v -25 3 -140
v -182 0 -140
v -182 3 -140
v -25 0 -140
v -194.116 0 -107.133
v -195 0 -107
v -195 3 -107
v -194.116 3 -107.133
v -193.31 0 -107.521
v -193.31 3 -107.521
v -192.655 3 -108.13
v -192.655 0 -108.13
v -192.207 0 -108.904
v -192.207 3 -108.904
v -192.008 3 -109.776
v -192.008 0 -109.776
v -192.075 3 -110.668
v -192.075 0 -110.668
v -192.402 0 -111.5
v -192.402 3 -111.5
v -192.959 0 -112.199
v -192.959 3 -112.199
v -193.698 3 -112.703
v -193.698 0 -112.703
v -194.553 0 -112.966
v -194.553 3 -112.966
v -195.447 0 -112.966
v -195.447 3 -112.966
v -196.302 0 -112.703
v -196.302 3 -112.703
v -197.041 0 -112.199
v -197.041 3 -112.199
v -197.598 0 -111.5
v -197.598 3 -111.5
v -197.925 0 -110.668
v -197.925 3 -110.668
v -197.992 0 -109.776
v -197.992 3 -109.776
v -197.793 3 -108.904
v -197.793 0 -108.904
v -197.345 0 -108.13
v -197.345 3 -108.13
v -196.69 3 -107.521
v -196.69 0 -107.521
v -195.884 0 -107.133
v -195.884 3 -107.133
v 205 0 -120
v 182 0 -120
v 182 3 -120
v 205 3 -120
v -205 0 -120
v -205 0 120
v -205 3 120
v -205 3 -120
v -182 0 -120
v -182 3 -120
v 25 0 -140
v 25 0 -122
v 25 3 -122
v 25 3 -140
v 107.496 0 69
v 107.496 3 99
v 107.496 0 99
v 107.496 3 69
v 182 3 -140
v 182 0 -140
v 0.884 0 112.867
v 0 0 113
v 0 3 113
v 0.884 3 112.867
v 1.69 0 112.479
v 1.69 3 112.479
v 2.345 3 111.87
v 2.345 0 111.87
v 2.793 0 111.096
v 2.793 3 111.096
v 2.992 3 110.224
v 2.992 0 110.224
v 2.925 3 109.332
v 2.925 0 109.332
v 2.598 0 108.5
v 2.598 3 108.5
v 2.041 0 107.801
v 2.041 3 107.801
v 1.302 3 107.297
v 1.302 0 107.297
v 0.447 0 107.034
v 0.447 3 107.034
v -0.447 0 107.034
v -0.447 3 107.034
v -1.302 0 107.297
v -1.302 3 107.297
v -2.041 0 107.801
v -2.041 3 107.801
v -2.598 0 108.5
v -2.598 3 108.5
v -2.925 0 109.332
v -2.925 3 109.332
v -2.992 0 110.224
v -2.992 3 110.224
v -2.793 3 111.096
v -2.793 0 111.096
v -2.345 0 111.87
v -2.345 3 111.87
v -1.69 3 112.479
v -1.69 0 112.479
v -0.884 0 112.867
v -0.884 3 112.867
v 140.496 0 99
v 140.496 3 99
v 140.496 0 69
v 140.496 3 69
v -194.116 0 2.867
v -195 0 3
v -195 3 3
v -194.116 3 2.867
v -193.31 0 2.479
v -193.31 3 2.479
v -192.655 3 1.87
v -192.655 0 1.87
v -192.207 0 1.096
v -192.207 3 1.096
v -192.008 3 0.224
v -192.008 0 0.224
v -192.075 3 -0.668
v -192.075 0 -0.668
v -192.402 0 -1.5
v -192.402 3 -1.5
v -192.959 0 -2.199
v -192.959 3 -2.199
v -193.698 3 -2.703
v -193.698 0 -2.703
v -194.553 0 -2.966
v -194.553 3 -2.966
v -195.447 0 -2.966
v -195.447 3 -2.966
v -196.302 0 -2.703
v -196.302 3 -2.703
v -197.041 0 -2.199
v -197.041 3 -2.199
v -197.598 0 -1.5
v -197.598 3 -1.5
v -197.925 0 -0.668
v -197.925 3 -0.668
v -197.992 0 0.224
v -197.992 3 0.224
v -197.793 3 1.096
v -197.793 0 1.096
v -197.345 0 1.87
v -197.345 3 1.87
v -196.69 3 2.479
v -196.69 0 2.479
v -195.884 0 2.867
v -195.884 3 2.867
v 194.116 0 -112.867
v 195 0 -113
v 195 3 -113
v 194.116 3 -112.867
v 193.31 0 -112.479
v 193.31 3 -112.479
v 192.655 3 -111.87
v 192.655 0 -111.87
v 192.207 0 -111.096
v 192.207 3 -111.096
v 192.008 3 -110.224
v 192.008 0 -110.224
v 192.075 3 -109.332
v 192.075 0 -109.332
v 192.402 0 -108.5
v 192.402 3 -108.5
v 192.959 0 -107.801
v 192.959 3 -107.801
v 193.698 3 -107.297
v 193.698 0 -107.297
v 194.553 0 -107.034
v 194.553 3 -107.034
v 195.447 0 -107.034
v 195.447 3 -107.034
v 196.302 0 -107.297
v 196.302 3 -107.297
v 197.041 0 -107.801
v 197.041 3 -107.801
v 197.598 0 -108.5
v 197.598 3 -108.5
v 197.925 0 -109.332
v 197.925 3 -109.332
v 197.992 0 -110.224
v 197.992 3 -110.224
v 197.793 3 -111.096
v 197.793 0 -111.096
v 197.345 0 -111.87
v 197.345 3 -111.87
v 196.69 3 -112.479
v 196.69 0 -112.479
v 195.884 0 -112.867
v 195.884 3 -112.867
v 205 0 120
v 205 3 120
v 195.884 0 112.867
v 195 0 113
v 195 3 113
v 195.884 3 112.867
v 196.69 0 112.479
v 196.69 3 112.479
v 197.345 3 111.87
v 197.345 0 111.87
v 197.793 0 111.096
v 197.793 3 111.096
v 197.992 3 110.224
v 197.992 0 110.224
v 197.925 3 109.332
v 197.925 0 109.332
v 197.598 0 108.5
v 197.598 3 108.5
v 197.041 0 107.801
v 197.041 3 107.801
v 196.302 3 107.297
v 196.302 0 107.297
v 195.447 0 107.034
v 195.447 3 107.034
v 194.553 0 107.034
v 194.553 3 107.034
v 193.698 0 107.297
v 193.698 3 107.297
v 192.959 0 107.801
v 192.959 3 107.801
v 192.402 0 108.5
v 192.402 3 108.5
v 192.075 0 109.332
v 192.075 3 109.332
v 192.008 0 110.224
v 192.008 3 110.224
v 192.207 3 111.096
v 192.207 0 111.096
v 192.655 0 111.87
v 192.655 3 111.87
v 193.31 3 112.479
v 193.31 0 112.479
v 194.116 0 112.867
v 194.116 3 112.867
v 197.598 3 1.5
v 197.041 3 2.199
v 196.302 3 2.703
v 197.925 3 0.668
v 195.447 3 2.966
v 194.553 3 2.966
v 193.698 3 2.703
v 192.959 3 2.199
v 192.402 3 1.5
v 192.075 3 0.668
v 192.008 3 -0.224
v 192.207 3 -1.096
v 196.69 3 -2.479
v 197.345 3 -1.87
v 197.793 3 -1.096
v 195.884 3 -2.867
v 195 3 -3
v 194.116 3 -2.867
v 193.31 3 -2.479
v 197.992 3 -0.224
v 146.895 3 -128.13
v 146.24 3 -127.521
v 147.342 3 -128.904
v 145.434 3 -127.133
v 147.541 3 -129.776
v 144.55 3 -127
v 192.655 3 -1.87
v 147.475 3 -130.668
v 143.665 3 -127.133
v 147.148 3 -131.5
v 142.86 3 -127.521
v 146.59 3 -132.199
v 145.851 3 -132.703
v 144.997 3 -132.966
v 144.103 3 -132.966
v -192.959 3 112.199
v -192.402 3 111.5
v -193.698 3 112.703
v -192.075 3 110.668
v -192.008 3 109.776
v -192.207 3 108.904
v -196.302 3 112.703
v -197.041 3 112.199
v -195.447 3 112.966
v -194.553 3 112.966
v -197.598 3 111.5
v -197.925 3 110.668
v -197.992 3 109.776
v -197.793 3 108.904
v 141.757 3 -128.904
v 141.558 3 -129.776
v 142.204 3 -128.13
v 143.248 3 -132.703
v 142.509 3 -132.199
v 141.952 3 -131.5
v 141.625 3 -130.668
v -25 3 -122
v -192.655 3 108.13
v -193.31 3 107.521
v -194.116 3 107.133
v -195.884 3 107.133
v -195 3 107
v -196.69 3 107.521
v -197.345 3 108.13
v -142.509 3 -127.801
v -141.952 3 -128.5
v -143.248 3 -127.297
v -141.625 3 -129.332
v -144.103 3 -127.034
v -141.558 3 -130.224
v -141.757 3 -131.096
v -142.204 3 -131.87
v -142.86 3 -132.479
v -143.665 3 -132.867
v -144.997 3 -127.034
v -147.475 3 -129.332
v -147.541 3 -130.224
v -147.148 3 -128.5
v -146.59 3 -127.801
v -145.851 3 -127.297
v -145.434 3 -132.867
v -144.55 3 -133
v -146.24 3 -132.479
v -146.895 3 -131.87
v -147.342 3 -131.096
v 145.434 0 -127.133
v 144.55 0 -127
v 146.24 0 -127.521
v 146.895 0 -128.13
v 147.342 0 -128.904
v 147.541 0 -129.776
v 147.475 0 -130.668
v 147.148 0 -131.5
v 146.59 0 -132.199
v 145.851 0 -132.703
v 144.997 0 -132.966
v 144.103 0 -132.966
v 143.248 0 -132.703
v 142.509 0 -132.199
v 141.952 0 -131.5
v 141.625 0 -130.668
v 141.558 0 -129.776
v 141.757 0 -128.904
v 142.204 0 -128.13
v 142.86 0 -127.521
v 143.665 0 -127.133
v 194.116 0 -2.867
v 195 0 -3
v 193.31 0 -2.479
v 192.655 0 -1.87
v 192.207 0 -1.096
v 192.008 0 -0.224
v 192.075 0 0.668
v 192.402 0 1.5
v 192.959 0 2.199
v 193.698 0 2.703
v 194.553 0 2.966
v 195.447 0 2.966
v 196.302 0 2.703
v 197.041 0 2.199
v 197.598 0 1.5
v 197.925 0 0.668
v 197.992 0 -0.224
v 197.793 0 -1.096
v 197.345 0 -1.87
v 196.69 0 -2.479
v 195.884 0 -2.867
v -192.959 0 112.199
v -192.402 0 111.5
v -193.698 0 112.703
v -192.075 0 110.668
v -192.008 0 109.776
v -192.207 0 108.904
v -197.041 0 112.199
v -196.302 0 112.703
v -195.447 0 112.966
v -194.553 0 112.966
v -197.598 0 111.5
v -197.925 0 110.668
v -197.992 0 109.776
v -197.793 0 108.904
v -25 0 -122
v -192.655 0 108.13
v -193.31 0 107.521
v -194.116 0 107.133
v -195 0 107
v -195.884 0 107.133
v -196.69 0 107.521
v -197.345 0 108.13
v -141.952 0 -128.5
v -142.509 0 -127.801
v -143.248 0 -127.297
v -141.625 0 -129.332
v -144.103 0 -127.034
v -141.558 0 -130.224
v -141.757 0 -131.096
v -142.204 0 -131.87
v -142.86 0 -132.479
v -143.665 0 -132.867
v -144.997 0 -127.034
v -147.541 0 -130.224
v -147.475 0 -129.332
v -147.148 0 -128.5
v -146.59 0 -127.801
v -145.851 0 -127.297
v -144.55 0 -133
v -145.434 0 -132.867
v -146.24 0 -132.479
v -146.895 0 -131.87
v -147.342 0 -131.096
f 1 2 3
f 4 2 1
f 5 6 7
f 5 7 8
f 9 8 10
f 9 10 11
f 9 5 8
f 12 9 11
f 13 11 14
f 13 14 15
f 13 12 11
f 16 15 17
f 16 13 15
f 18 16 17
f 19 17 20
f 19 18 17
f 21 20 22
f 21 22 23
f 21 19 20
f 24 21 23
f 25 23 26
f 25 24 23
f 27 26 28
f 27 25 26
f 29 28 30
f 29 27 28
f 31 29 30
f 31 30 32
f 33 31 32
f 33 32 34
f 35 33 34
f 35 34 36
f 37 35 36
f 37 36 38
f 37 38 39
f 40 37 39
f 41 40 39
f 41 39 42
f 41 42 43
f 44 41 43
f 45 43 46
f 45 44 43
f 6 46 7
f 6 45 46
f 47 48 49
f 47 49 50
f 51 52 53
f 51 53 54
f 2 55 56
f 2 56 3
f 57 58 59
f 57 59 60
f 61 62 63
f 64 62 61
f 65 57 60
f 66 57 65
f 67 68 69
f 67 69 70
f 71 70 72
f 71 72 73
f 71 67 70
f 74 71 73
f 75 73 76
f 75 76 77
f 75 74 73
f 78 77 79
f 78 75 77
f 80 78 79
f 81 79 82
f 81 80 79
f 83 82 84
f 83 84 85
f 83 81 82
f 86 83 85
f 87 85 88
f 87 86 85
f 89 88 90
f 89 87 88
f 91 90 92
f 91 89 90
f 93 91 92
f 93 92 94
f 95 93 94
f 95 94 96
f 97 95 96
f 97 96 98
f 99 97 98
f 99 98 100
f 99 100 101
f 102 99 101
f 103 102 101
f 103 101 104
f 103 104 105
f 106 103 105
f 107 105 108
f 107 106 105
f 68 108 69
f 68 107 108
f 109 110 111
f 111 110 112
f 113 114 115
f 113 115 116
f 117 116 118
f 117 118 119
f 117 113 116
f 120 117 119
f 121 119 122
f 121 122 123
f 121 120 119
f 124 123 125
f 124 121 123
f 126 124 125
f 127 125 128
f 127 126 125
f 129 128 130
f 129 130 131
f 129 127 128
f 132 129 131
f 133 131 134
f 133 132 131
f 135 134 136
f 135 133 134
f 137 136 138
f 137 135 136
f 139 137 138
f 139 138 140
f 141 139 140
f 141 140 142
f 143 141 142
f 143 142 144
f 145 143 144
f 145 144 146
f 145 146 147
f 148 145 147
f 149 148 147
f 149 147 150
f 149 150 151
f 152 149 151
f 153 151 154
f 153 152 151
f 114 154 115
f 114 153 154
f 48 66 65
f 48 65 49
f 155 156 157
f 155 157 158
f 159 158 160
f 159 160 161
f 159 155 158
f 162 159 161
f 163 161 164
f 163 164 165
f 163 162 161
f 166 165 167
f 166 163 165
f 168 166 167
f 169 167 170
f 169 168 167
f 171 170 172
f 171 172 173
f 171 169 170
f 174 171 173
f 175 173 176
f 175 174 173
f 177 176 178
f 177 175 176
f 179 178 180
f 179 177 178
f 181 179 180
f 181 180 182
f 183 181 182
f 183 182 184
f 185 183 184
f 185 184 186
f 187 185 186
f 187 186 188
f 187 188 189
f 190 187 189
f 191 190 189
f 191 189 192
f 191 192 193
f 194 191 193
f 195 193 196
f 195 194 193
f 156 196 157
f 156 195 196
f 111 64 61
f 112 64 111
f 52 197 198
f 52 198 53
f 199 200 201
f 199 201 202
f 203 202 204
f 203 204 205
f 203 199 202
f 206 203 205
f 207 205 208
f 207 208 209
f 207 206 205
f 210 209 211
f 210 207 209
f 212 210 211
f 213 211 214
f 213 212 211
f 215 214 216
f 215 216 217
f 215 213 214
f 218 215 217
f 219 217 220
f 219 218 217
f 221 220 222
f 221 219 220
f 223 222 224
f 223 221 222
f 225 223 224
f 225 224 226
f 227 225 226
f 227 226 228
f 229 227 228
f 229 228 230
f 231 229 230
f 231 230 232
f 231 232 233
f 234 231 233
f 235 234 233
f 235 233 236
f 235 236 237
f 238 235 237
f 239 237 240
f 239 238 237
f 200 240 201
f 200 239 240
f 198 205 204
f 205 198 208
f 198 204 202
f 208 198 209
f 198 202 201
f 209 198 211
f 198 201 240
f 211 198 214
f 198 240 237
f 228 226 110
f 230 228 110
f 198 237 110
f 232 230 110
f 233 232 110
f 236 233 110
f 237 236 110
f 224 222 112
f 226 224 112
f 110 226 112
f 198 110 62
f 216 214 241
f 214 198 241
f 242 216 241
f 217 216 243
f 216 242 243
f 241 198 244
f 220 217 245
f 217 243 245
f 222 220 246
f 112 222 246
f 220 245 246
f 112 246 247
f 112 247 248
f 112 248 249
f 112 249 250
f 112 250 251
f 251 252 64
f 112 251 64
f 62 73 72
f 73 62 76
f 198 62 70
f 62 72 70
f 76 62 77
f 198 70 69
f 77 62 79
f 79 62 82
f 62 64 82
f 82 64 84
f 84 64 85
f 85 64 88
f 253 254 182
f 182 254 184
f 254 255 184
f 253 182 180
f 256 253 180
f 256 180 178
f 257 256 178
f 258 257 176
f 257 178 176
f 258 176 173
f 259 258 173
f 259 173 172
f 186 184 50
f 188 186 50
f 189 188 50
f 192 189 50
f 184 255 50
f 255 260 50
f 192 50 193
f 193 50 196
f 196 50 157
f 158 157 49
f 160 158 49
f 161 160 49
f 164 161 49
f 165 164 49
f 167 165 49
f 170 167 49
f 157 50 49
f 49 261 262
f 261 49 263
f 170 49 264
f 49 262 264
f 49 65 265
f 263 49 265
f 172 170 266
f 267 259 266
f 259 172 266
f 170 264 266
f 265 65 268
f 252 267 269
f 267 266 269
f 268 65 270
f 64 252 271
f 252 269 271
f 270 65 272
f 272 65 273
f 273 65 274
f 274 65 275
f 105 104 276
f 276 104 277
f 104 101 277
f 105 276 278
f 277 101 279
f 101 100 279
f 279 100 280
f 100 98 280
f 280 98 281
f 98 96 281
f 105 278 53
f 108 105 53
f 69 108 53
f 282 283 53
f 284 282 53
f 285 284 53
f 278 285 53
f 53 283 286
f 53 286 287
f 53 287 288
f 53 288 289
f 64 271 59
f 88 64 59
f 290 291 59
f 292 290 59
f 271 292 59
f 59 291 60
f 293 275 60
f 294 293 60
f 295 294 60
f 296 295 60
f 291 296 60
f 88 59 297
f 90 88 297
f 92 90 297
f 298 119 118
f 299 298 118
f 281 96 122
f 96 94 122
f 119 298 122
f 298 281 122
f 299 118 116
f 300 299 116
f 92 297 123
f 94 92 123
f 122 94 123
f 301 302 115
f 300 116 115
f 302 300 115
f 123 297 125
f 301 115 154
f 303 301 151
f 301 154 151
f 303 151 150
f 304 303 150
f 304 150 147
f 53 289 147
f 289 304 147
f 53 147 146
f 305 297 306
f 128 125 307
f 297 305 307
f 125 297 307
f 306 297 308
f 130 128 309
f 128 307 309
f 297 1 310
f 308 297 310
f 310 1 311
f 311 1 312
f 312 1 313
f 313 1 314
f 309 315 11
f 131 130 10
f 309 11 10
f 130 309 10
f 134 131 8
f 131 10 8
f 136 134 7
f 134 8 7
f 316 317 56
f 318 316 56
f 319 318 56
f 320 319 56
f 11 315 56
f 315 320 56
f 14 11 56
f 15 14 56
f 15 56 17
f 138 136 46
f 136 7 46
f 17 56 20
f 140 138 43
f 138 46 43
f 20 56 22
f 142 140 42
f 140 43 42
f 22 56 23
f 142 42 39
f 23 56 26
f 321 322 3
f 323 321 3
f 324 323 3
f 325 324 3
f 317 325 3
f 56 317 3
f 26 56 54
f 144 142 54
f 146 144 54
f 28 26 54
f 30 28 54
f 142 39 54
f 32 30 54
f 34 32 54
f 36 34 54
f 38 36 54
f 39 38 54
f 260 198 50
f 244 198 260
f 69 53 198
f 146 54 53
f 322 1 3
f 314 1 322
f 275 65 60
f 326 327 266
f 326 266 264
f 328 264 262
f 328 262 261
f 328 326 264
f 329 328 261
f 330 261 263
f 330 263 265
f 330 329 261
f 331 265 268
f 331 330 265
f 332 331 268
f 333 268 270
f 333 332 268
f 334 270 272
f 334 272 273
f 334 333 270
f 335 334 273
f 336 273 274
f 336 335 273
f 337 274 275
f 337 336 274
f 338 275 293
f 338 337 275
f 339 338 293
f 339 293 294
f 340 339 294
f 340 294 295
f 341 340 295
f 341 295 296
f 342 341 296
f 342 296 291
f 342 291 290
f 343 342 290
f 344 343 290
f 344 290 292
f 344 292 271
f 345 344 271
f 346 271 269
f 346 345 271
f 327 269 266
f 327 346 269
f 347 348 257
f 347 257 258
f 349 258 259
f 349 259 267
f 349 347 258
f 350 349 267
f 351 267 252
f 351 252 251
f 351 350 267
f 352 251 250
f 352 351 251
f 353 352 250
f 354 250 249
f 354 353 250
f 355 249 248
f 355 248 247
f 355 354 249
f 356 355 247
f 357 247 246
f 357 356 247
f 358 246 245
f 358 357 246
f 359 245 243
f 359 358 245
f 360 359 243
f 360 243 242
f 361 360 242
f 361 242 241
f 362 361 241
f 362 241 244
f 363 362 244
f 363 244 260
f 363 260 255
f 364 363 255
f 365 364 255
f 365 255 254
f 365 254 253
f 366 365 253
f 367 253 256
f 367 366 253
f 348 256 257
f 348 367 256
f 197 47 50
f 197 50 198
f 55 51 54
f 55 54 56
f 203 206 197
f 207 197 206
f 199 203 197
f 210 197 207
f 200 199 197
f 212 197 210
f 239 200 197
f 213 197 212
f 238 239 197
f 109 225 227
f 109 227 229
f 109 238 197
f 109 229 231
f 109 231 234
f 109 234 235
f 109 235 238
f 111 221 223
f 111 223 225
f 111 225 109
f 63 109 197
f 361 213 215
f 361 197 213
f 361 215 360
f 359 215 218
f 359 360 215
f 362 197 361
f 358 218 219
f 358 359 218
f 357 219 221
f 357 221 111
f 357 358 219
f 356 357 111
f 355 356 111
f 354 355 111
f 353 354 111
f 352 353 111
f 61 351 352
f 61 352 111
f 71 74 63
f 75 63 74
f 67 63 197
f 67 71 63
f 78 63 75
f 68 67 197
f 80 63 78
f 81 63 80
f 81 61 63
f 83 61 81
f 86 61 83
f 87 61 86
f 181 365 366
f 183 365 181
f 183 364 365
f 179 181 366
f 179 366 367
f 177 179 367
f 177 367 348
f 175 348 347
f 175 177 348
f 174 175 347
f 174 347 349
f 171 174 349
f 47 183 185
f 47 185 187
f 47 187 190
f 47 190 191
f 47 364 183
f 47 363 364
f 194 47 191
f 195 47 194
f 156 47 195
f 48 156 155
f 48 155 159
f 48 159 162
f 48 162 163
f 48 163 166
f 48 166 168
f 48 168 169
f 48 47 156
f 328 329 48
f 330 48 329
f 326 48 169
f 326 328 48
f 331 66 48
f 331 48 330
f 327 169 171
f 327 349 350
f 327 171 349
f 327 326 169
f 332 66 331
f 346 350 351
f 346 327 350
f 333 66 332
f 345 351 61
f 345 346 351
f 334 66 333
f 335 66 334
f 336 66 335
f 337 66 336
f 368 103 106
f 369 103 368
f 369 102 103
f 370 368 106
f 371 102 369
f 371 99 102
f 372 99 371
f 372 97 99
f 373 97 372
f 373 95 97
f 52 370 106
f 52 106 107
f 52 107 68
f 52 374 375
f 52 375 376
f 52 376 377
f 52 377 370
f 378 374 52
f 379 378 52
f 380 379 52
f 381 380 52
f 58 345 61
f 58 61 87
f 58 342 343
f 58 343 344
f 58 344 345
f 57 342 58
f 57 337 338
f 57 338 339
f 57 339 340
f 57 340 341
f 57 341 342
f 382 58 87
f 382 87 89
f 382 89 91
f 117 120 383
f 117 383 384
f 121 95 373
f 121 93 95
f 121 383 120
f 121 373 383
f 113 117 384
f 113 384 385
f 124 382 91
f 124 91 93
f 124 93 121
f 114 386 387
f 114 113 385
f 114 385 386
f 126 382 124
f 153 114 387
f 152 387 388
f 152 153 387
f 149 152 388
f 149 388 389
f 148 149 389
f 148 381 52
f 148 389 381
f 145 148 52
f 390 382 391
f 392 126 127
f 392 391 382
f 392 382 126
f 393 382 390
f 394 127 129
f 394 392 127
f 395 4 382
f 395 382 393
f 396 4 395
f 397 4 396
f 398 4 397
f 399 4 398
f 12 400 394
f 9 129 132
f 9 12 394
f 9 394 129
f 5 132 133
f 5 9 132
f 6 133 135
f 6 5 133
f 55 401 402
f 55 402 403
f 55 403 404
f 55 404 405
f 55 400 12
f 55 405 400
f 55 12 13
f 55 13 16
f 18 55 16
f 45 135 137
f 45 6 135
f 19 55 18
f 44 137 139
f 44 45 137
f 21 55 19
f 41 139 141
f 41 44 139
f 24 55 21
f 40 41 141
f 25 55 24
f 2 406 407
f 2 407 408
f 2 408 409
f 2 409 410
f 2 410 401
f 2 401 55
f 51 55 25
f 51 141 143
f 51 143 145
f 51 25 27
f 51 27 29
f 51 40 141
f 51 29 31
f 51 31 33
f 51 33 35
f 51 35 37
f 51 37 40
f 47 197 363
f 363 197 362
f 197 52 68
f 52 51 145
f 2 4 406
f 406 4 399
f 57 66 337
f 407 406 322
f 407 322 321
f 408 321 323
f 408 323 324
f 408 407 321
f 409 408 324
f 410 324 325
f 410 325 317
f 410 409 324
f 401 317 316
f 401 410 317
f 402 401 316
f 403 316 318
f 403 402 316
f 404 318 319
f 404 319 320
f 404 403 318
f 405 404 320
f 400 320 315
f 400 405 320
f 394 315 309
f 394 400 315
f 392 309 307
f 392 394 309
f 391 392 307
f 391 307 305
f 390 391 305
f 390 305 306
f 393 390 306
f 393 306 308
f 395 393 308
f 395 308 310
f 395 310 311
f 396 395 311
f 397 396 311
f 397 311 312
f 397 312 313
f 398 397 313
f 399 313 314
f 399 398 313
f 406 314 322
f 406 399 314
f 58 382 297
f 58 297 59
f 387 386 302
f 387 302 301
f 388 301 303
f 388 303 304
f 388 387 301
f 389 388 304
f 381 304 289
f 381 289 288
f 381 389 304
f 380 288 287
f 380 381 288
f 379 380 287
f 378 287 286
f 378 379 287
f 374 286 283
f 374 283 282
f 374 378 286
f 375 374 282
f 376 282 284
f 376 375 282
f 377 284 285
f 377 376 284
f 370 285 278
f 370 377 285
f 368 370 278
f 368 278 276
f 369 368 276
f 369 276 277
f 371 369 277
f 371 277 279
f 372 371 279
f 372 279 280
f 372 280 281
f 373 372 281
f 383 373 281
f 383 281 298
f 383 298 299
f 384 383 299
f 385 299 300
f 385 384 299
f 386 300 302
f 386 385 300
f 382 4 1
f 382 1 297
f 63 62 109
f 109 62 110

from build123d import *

# Parameters (mm, degrees)
CROQUIS1_R              = 3
SALIENTE_EXTRUIR1_DEPTH = 3
CROQUIS2_W              = 33
CROQUIS2_H              = 30
CORTAR_EXTRUIR2_DEPTH   = 3


with BuildPart() as part:
    # Croquis1 → Saliente-Extruir1 (new body)
    with BuildSketch(Plane(origin=(0, 0, 0), x_dir=(1, 0, 0), z_dir=(0, 1, 0))):
        Polygon((182, 120), (205, 120), (205, -120), (-205, -120), (-205, 120), (-182, 120), (-182, 140), (-25, 140), (-25, 122), (25, 122), (25, 140), (182, 140), align=None)
        with Locations(Location((-195, 110, 0), (0, 0, 270))):
            Circle(CROQUIS1_R, mode=Mode.SUBTRACT)
        with Locations(Location((-195, 0, 0), (0, 0, 270))):
            Circle(CROQUIS1_R, mode=Mode.SUBTRACT)
        with Locations(Location((-195, -110, 0), (0, 0, 90))):
            Circle(CROQUIS1_R, mode=Mode.SUBTRACT)
        with Locations(Location((195, -110, 0), (0, 0, 270))):
            Circle(CROQUIS1_R, mode=Mode.SUBTRACT)
        with Locations(Location((195, 0, 0), (0, 0, 90))):
            Circle(CROQUIS1_R, mode=Mode.SUBTRACT)
        with Locations(Location((195, 110, 0), (0, 0, 90))):
            Circle(CROQUIS1_R, mode=Mode.SUBTRACT)
        with Locations(Location((0, -110, 0), (0, 0, 270))):
            Circle(CROQUIS1_R, mode=Mode.SUBTRACT)
        with Locations(Location((144.549746064, 130, 0), (0, 0, 270))):
            Circle(CROQUIS1_R, mode=Mode.SUBTRACT)
        with Locations(Location((-144.549746064, 130, 0), (0, 0, 90))):
            Circle(CROQUIS1_R, mode=Mode.SUBTRACT)
    extrude(amount=SALIENTE_EXTRUIR1_DEPTH)

    # Croquis2 → Cortar-Extruir2 (cut)
    with BuildSketch(Plane(origin=(0, 3, 0), x_dir=(1, 0, 0), z_dir=(0, 1, 0))):
        with Locations((123.996419689, -84)):
            Rectangle(CROQUIS2_W, CROQUIS2_H)
    extrude(amount=-CORTAR_EXTRUIR2_DEPTH, mode=Mode.SUBTRACT)


solid = part.part
